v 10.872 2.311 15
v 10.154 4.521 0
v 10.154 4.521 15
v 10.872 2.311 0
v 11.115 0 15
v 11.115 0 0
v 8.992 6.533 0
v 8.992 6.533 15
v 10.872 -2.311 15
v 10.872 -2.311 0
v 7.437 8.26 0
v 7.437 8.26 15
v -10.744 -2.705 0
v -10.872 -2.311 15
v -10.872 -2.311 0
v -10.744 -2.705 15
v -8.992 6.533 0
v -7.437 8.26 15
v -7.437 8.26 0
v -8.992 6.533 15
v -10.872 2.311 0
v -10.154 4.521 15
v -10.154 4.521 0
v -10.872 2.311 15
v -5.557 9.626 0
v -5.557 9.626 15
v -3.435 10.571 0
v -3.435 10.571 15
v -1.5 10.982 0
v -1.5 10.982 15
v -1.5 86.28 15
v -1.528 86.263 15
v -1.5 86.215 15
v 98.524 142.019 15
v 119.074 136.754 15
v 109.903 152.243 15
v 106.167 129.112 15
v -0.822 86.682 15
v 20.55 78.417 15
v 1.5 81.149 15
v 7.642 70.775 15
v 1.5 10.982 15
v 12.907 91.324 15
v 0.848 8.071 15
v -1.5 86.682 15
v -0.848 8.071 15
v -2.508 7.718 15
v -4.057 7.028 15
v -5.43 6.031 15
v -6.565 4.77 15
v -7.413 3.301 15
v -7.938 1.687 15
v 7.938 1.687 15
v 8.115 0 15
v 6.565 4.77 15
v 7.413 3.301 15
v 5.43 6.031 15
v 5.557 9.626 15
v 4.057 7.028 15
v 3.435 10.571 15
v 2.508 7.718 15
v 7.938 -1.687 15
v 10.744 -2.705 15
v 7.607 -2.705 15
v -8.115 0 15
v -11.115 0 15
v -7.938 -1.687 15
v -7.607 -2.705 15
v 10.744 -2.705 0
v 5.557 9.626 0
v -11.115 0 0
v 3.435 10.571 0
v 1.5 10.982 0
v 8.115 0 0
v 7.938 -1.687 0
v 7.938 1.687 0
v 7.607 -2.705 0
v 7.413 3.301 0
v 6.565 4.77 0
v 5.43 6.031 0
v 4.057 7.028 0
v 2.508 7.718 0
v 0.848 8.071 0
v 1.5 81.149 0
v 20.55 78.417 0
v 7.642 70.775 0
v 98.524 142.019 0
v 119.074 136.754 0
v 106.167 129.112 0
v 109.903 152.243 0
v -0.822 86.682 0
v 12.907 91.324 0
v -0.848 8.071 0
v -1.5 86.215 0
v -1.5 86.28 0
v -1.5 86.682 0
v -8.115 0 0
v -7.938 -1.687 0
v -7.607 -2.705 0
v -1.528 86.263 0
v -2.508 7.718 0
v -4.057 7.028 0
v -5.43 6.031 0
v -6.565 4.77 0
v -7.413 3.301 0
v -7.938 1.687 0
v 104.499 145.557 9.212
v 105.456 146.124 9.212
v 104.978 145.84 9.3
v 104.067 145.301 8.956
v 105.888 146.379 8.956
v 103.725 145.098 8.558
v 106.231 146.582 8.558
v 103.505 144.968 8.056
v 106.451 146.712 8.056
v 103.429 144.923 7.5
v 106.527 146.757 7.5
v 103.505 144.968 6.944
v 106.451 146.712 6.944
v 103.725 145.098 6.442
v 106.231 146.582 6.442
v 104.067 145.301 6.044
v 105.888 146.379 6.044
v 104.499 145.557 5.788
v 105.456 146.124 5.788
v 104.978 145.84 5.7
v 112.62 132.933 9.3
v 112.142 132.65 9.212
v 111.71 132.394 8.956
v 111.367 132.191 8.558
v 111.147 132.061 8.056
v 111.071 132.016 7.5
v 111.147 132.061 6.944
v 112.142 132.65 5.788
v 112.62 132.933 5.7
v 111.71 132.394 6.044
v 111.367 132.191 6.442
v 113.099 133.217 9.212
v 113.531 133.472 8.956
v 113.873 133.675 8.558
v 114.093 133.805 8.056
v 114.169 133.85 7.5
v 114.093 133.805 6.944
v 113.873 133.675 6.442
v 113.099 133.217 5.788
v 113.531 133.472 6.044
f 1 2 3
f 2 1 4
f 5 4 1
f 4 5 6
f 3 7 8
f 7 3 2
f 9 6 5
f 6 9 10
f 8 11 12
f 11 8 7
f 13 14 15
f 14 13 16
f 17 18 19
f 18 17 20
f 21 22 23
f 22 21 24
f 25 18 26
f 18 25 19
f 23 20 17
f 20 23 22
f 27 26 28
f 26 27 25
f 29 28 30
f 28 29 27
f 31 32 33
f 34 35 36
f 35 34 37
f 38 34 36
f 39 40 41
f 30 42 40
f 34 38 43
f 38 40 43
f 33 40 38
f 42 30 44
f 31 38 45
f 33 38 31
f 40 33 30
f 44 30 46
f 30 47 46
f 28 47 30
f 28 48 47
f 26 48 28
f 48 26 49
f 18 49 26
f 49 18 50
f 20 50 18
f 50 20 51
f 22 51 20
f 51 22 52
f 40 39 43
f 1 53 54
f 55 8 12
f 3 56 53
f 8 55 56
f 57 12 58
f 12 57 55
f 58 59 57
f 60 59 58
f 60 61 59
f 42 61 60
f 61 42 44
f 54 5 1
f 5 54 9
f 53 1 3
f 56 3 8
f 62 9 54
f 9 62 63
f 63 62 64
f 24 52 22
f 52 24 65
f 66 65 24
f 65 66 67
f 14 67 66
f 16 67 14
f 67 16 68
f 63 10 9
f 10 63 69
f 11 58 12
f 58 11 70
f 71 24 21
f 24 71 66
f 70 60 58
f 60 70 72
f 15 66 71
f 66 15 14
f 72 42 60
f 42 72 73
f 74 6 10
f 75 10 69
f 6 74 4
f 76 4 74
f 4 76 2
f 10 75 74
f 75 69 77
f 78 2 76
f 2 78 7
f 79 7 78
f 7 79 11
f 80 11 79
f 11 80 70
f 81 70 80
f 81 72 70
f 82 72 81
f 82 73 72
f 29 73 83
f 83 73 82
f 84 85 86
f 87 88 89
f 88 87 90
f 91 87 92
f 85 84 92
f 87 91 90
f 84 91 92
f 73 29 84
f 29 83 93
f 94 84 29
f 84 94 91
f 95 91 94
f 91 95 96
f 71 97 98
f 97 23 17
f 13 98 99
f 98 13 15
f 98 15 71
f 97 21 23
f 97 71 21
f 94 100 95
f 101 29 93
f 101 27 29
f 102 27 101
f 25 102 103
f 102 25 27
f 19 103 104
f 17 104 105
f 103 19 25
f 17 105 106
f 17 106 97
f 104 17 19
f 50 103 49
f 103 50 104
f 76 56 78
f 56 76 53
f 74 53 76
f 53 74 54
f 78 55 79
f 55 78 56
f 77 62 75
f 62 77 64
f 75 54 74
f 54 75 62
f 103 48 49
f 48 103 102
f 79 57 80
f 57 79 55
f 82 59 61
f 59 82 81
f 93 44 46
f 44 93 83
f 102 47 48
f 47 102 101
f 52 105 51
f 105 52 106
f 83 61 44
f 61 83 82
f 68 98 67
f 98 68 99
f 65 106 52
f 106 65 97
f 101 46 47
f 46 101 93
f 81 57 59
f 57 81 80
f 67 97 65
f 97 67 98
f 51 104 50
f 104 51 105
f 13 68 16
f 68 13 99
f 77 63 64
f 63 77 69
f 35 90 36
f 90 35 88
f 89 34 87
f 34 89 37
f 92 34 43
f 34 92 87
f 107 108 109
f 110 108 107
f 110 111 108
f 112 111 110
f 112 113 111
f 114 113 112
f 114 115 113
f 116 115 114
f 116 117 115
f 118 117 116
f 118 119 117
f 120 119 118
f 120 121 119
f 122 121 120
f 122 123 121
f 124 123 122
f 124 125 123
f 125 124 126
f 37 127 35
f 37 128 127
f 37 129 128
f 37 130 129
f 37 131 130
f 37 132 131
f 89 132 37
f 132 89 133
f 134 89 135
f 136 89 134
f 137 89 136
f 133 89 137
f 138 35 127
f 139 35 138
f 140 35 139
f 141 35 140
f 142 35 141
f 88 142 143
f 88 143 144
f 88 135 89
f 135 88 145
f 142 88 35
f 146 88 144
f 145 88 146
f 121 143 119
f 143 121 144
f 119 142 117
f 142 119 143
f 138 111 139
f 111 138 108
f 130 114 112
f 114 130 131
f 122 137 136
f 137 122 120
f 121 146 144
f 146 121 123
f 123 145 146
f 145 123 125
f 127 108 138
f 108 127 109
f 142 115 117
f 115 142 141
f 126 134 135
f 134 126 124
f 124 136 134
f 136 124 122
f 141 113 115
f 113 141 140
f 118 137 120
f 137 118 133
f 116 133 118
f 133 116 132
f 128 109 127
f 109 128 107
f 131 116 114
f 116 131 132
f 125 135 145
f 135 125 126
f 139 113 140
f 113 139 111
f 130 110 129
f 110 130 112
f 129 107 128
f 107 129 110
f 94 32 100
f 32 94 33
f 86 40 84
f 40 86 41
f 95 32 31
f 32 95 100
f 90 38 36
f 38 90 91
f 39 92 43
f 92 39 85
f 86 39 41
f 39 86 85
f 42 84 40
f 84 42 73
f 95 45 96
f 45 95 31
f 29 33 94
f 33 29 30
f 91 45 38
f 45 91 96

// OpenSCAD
use <MCAD/regular_shapes.scad>

r = 16.23/2;
t = 15;

grip_angle = 25;
l = 59 / cos(grip_angle);
w = 3;

base_to_hole = 122;

cloud_h = 10;
top_angle = atan((sin(grip_angle)*59 + cloud_h) / 59);
top_l = 59/cos(top_angle);

screw_d = 3.6;

module stick(l=l, grip_angle=grip_angle){
    intersection(){
        cylinder_tube(t, r+w, w);
        translate([0, 50 - r/3, 0])
        cube([100, 100, 100], center=true);
    }

    translate([0, l/2 + r, t/2])
    cube([w, l, t], center=true);

    grip = 10;

    translate([0, l + r - w, 0])
    rotate([0, 0, grip_angle]){
        cube([base_to_hole + t/2, w, t]);
        translate([base_to_hole - t/2, -t, 0])
        difference(){
            cube([t, t, t]);
            translate([t/2, 0, t/2])
            rotate([-90, 0, 0])
            cylinder(2*t, screw_d/2, screw_d/2, $fn=20);
        }
        translate([0, -t, 0])
        cube([t, t, t]);
    }
}

//stick();
//translate([0, 0, 0])
//rotate([0, 0, grip_angle - top_angle])
stick(l=top_l+10, grip_angle=top_angle);
